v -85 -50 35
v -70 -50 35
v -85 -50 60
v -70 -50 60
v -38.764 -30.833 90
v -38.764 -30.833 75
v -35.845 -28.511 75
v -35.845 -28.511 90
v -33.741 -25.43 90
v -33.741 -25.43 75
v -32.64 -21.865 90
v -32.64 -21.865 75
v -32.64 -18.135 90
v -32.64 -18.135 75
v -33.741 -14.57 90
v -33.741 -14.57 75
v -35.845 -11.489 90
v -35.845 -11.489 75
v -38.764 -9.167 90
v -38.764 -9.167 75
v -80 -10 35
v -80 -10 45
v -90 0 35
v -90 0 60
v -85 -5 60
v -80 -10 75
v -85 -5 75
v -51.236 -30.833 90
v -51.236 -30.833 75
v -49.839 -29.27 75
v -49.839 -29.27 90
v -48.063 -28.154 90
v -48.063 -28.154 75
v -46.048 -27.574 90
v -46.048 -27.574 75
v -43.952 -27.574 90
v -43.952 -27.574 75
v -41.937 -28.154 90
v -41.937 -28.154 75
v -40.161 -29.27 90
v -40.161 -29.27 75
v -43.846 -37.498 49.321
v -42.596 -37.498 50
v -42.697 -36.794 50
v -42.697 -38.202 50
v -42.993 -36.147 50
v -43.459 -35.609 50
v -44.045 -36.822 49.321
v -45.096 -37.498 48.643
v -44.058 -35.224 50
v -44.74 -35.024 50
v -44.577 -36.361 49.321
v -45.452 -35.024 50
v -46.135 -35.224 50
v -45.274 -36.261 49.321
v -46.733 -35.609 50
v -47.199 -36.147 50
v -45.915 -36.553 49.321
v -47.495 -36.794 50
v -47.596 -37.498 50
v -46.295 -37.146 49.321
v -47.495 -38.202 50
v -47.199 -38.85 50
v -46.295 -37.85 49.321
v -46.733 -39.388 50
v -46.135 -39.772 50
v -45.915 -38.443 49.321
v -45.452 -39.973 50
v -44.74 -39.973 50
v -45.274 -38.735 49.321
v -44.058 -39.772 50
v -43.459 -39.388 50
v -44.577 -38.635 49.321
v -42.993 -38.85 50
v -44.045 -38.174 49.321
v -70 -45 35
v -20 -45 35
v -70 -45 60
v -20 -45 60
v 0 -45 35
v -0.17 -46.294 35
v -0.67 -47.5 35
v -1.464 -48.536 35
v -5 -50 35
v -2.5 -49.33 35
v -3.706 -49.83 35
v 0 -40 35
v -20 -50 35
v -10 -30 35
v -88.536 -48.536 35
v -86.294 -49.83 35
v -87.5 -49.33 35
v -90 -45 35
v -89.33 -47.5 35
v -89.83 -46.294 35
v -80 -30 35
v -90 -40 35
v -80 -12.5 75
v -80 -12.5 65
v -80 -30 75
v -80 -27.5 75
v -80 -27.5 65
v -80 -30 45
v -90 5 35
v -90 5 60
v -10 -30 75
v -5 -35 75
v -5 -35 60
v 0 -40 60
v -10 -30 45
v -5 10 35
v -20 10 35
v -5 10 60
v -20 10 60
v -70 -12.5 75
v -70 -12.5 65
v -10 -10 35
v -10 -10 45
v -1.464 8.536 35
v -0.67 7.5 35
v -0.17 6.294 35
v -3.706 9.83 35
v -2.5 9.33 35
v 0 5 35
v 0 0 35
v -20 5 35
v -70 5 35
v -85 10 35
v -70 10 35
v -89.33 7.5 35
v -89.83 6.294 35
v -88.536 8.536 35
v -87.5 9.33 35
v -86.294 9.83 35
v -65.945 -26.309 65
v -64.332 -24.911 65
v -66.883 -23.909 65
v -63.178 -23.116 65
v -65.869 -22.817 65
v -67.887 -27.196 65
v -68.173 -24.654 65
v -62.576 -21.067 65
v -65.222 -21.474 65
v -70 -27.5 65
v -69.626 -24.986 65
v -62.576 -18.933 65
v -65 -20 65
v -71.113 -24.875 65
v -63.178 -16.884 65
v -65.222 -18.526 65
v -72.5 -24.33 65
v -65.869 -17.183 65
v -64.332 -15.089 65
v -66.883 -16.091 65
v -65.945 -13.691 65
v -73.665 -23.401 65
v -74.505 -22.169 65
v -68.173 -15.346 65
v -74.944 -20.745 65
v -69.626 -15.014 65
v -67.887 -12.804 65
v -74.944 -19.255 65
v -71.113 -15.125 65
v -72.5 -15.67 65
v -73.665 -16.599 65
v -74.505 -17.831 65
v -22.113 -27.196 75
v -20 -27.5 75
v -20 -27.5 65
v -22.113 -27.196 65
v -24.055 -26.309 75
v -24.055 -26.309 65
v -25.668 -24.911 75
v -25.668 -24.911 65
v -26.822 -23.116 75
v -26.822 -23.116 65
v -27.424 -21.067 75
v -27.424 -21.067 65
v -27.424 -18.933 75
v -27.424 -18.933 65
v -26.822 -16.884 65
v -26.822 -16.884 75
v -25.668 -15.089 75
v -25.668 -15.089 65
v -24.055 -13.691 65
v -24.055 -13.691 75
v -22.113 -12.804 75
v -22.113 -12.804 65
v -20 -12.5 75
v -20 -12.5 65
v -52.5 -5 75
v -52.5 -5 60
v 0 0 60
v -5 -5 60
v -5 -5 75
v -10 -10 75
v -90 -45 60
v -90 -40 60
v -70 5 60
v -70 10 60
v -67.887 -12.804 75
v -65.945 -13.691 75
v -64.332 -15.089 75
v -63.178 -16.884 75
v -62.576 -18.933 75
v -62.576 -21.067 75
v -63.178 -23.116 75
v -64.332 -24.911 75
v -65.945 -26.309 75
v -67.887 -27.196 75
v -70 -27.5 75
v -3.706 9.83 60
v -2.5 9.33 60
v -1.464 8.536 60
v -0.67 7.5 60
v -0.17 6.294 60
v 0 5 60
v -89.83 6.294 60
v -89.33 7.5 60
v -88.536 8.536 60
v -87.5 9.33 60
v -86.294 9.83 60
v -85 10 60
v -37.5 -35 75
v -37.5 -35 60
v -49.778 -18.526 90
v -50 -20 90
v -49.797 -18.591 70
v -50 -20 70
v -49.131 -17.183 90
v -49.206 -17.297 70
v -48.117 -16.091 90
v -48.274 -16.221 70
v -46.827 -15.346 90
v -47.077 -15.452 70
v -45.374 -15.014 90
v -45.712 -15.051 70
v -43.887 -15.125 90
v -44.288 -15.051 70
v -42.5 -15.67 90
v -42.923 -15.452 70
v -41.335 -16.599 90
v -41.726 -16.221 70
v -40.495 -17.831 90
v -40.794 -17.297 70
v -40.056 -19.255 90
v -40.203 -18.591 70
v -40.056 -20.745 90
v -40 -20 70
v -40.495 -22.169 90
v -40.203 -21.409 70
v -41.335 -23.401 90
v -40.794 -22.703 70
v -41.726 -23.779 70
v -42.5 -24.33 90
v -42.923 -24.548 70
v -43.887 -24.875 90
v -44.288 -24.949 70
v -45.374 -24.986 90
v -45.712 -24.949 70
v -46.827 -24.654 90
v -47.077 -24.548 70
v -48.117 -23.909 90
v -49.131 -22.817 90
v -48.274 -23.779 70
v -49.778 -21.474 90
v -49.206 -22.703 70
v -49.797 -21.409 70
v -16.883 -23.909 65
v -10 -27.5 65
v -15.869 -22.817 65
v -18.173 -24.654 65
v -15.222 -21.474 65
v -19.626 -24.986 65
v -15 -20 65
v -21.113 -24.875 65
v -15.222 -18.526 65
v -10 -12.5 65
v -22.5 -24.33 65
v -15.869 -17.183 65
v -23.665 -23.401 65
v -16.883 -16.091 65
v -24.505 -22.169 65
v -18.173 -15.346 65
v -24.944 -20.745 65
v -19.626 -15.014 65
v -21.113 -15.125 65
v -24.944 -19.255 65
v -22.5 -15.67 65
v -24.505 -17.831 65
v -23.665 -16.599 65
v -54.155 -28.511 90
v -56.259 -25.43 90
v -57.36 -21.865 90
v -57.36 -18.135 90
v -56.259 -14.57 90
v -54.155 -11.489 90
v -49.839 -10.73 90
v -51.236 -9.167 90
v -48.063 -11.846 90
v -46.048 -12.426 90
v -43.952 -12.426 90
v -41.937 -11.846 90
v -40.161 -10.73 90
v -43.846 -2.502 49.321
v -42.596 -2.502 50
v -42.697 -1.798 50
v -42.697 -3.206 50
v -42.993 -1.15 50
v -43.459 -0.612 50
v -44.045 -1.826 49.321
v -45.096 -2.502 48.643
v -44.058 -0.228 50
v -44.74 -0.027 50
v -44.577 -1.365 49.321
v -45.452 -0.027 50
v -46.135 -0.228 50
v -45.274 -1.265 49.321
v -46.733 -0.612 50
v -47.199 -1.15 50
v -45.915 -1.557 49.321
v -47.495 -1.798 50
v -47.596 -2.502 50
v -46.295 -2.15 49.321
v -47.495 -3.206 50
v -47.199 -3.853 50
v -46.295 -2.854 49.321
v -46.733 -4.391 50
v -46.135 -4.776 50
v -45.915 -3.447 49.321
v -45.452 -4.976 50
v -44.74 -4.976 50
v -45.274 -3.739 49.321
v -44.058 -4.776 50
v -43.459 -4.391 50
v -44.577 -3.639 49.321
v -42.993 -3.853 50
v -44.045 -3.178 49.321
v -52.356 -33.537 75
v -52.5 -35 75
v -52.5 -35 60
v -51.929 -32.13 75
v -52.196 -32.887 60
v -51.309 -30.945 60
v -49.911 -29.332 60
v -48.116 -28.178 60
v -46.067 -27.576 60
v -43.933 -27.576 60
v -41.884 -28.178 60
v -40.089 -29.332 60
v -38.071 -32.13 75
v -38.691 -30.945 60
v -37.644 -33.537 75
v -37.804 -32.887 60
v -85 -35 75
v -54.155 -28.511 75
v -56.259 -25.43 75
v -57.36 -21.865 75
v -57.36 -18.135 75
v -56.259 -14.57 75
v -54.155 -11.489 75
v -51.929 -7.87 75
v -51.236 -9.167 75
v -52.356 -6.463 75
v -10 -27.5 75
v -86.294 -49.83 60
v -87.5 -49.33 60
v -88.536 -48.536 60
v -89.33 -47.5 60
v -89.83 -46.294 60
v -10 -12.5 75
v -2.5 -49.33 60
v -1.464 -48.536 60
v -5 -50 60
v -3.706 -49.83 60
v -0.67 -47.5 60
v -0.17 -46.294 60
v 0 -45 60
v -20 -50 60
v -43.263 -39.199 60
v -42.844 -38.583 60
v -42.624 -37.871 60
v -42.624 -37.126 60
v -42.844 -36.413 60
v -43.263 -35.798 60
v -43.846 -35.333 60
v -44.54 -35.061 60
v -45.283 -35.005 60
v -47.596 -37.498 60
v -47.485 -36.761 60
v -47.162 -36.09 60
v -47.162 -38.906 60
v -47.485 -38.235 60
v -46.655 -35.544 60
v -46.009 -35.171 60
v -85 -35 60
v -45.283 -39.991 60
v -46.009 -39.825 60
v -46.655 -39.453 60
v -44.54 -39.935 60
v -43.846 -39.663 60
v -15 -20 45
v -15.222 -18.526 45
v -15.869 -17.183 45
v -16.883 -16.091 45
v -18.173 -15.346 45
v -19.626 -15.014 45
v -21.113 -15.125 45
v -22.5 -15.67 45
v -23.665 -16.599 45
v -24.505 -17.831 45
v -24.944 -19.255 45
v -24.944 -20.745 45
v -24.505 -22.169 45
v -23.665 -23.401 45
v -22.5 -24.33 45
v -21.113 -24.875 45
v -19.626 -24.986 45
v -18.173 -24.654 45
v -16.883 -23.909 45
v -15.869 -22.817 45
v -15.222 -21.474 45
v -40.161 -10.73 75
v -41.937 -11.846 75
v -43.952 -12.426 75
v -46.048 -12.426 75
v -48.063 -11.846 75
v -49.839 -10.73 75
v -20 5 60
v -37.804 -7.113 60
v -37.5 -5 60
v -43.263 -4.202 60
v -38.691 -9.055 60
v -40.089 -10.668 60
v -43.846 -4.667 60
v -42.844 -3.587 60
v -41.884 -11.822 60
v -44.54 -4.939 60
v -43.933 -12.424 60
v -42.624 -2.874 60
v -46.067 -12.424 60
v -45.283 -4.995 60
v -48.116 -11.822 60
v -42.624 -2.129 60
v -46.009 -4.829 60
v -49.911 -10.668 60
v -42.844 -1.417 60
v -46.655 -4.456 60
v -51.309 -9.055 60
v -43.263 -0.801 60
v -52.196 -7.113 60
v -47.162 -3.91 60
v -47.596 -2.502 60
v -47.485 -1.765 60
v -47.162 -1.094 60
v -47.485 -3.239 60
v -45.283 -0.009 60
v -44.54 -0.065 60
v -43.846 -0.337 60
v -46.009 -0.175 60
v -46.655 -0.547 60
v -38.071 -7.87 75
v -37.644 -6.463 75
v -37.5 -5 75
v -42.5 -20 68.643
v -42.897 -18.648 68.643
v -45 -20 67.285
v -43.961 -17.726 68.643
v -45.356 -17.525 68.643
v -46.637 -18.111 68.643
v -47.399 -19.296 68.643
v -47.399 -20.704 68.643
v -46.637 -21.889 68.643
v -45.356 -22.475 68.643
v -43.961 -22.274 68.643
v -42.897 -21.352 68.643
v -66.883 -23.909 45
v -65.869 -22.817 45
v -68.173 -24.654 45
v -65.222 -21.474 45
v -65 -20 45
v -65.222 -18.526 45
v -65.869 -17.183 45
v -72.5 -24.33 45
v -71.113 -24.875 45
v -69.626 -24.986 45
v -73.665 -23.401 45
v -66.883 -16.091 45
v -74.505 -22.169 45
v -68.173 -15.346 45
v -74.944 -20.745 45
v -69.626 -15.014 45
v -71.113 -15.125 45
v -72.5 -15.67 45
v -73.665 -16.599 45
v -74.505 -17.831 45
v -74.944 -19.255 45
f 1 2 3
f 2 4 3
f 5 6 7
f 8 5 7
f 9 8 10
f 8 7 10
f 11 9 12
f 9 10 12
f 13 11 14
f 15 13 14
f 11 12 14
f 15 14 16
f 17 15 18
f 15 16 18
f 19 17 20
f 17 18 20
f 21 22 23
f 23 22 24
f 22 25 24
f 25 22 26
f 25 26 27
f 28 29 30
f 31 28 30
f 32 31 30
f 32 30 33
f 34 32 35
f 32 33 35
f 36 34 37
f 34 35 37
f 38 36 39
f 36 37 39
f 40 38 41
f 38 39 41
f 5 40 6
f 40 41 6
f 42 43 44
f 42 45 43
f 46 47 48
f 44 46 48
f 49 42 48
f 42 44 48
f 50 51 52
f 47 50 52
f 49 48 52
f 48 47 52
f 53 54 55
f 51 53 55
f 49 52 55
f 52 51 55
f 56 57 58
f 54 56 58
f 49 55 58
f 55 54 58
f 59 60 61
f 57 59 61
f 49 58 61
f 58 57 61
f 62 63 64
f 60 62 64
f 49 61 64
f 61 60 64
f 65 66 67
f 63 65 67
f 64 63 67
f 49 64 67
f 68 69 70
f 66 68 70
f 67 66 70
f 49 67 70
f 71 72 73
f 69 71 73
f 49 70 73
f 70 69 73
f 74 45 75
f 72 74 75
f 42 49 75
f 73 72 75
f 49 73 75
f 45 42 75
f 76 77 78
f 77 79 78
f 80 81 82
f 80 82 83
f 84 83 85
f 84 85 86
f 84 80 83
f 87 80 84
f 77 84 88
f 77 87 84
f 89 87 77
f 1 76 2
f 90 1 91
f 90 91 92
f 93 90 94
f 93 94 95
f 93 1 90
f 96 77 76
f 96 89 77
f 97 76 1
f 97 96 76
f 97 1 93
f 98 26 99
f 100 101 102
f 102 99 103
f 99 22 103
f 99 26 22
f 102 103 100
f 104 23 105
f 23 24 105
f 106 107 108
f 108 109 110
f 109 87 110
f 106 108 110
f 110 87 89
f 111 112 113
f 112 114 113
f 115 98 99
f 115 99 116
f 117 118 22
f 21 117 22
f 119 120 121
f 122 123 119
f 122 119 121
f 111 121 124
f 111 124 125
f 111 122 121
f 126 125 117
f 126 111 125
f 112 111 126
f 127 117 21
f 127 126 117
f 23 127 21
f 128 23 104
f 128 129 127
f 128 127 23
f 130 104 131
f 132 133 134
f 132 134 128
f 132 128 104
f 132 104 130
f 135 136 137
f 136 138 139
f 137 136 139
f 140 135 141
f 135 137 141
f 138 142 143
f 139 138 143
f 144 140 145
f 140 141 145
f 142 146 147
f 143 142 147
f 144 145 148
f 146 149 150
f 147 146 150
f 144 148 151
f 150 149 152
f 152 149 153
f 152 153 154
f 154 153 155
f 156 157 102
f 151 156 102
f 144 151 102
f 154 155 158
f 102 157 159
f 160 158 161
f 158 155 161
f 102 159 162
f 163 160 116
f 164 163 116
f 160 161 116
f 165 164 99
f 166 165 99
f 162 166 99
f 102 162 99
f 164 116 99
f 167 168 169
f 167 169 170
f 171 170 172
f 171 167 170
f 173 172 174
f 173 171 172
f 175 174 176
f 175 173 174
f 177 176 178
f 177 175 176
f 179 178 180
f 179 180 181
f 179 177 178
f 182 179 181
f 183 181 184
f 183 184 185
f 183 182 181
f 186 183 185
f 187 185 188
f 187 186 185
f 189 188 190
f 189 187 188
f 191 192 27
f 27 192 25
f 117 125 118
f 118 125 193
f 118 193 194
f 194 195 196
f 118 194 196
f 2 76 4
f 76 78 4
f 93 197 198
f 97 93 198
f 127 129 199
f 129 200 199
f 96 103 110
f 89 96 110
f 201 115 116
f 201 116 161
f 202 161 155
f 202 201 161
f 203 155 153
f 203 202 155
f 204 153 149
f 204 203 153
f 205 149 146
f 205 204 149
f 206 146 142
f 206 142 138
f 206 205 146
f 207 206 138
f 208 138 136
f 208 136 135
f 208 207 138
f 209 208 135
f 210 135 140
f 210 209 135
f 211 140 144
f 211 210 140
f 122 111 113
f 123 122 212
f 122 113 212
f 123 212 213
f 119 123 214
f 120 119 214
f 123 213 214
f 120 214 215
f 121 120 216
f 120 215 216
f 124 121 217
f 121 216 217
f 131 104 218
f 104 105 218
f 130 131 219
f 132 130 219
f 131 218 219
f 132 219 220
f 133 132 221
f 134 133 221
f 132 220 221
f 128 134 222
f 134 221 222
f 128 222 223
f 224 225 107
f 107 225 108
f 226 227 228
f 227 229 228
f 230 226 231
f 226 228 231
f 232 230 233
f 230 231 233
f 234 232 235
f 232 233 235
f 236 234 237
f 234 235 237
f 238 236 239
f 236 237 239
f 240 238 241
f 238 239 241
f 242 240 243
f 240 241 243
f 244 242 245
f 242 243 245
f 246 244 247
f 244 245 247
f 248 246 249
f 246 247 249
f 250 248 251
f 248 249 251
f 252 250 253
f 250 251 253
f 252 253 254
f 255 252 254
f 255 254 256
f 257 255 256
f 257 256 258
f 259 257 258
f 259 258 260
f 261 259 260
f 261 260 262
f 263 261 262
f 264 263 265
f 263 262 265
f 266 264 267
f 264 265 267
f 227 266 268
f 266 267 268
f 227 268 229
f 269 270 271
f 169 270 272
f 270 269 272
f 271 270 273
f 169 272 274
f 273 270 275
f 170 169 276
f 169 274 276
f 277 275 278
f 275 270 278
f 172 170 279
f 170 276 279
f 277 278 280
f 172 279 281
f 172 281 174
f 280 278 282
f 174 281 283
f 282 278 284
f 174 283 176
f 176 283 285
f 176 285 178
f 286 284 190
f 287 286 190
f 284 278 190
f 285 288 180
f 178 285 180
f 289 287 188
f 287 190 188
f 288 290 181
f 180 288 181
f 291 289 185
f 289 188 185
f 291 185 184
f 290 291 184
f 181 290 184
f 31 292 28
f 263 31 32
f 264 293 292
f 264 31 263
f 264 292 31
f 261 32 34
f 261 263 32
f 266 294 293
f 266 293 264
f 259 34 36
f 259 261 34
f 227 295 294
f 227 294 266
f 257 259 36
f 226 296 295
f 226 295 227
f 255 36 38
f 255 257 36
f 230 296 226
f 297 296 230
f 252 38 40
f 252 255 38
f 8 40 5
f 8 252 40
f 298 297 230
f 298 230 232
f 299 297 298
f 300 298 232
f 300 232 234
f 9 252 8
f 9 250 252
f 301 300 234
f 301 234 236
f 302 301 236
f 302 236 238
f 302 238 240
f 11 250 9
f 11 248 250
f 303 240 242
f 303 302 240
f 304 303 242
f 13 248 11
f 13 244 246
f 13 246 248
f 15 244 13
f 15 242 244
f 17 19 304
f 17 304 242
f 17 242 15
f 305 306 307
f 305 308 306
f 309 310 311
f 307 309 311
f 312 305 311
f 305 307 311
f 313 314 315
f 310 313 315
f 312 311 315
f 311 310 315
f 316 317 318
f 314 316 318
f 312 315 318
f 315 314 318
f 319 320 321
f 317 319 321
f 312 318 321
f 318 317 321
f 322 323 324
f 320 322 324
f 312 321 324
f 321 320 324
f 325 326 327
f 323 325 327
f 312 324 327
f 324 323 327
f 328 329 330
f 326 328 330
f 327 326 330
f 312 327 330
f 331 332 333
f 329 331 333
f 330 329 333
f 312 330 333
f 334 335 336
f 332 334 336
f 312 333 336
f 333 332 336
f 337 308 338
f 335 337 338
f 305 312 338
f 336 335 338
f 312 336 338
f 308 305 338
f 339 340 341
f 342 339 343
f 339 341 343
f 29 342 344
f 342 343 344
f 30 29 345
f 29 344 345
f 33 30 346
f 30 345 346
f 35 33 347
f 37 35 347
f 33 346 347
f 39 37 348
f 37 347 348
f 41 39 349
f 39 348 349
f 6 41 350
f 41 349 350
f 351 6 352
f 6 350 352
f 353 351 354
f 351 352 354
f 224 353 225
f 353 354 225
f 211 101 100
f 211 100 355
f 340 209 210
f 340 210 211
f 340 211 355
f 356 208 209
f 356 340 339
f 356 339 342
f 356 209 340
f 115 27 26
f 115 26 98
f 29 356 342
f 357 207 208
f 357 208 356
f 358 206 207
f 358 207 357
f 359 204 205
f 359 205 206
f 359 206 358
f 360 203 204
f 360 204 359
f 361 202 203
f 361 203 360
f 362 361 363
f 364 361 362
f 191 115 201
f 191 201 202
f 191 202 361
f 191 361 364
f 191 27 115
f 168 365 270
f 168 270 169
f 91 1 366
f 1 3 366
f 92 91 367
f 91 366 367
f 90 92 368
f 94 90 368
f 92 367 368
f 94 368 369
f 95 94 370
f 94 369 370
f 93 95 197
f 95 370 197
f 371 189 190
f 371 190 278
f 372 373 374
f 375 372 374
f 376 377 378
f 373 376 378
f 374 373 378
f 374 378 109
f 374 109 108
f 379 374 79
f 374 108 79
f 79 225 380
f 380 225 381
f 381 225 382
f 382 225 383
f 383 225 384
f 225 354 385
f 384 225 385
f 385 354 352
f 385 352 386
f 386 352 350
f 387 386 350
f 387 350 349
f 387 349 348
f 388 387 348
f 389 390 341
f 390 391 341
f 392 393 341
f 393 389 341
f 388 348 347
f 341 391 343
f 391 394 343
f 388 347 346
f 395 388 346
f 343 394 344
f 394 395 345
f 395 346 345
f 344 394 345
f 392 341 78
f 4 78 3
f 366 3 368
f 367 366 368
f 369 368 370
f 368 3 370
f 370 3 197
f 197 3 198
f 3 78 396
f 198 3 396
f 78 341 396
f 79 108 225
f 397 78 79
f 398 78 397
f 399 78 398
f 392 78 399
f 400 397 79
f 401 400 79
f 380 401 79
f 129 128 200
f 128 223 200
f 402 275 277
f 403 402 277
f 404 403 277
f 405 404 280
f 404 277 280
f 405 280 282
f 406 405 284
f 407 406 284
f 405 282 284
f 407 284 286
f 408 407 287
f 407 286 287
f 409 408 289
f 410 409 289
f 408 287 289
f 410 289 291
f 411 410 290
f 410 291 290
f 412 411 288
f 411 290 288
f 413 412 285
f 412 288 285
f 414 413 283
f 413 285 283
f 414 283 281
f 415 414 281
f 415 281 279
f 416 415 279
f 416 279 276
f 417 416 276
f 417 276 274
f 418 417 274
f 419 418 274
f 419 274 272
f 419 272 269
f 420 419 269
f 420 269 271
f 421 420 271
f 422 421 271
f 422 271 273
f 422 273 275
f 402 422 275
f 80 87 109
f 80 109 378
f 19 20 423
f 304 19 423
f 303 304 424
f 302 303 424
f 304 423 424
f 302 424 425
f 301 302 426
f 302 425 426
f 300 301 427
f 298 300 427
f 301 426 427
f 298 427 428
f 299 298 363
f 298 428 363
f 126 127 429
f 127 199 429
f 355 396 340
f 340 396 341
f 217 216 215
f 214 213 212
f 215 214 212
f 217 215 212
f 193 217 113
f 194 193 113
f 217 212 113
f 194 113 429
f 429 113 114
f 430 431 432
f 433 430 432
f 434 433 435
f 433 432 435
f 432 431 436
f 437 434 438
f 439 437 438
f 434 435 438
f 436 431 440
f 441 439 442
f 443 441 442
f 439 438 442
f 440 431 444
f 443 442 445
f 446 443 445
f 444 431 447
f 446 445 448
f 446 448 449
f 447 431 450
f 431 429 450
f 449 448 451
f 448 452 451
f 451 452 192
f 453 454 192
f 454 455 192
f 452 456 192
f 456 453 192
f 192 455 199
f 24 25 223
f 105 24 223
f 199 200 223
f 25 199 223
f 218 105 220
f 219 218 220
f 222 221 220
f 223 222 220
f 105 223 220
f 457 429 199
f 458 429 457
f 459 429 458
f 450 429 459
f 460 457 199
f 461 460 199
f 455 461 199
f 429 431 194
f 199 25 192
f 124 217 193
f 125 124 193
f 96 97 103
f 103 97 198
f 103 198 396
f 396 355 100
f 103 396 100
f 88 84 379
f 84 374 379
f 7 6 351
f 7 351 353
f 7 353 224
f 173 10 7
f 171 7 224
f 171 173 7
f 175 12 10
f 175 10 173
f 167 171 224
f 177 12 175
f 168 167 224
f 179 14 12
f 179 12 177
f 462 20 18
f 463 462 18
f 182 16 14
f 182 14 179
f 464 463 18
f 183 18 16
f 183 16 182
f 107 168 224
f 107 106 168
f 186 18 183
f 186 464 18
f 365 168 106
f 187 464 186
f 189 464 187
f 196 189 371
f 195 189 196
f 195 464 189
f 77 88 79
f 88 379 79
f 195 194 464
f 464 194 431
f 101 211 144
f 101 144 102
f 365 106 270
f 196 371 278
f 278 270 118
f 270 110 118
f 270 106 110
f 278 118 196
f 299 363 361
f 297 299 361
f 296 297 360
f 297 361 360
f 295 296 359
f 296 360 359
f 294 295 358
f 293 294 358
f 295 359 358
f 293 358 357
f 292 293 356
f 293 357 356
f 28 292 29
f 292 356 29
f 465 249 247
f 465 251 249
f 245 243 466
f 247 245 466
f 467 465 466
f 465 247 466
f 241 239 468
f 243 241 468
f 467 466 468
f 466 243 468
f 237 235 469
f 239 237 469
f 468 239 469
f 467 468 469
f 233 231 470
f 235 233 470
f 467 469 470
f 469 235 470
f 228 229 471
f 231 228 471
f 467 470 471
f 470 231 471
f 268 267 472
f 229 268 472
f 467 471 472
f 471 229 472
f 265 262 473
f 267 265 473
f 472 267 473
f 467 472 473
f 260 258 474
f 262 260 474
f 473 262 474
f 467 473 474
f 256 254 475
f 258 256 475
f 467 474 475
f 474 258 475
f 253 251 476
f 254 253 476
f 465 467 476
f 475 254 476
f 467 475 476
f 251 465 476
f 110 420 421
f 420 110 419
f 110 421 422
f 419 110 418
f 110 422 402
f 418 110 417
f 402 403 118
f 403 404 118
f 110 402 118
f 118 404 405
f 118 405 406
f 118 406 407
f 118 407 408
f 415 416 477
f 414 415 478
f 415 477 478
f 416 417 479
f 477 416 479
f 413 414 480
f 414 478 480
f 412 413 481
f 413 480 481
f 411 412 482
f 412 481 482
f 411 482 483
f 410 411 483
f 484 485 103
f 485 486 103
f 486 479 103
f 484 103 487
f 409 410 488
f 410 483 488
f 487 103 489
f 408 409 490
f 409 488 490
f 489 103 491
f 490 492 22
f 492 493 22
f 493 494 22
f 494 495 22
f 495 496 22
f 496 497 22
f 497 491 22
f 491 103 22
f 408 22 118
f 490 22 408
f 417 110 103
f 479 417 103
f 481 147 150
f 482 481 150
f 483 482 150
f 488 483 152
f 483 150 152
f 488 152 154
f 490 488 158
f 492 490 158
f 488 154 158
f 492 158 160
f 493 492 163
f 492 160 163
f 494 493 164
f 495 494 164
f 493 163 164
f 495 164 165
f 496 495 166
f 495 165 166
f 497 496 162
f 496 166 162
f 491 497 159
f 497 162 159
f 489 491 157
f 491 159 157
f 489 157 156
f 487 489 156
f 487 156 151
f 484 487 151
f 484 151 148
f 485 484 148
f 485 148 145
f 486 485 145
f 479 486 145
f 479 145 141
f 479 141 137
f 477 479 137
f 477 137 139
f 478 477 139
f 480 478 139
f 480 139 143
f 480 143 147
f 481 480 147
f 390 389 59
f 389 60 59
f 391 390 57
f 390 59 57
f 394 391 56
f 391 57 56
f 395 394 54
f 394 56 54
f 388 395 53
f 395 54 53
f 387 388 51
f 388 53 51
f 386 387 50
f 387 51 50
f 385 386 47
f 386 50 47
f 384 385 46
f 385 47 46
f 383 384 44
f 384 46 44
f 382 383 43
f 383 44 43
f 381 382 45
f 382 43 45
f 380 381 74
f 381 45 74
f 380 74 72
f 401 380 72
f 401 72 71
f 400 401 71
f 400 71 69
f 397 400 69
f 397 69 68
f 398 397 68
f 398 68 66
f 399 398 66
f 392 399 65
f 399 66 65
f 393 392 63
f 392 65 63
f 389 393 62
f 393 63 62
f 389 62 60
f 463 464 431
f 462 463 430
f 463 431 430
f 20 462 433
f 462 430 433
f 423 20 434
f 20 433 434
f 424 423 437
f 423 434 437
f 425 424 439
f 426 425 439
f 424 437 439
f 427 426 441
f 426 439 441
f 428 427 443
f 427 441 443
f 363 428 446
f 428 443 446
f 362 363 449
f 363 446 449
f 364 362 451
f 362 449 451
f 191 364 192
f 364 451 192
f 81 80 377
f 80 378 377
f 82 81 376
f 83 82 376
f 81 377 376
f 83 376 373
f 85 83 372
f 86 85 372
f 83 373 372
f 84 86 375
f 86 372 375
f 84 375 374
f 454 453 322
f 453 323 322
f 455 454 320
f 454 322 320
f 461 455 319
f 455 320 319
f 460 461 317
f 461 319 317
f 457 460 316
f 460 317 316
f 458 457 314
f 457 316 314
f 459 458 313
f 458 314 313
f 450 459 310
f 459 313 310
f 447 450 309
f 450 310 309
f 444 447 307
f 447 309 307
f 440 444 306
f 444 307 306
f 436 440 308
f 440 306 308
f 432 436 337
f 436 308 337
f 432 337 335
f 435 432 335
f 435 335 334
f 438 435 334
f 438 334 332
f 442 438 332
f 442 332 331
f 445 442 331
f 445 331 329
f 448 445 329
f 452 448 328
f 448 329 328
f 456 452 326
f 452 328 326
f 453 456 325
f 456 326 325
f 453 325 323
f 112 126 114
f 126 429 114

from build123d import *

# Parameters (mm, degrees)
BOSS_EXTRUDE1_DEPTH            = 60
SKETCH2_W                      = 30
SKETCH2_H                      = 10
CUT_EXTRUDE1_DEPTH             = 253
BOSS_EXTRUDE2_DEPTH            = 15
CUT_EXTRUDE5_DEPTH             = 10
SKETCH8_R                      = 5
CUT_EXTRUDE6_DEPTH             = 124
BOSS_EXTRUDE3_DEPTH            = 15
SKETCH15_W                     = 45
SKETCH15_H                     = 60
CUT_EXTRUDE8_DEPTH             = 90
BOSS_EXTRUDE4_DEPTH            = 10
F_1_2_1_2_DIAMETER_HOLE7_D     = 5
F_1_2_1_2_DIAMETER_HOLE7_DEPTH = 10
F_1_2_1_2_DIAMETER_HOLE7_TIP   = 1.357389249
F_10_0_10_DIAMETER_HOLE4_D     = 10
F_10_0_10_DIAMETER_HOLE4_DEPTH = 20
F_10_0_10_DIAMETER_HOLE4_TIP   = 2.714778498


with BuildPart() as part:
    # Sketch1 → Boss-Extrude1 (new body)
    with BuildSketch(Plane.XY):
        with BuildLine():
            Line((-90, 0), (-90, 5))
            ThreePointArc((-90, 5), (-88.535533906, 8.535533906), (-85, 10))
            Line((-85, 10), (-70, 10))
            Line((-70, 10), (-70, 5))
            Line((-70, 5), (-20, 5))
            Line((-20, 5), (-20, 10))
            Line((-20, 10), (-5, 10))
            ThreePointArc((-5, 10), (-1.464466094, 8.535533906), (0, 5))
            Line((0, 5), (0, 0))
            Line((0, 0), (-10, -10))
            Line((-10, -10), (-10, -30))
            Line((-10, -30), (0, -40))
            Line((0, -40), (0, -45))
            ThreePointArc((0, -45), (-1.464466094, -48.535533906), (-5, -50))
            Line((-5, -50), (-20, -50))
            Line((-20, -50), (-20, -45))
            Line((-20, -45), (-70, -45))
            Line((-70, -45), (-70, -50))
            Line((-70, -50), (-85, -50))
            ThreePointArc((-85, -50), (-88.535533906, -48.535533906), (-90, -45))
            Line((-90, -45), (-90, -40))
            Line((-90, -40), (-80, -30))
            Line((-80, -30), (-80, -10))
            Line((-80, -10), (-90, 0))
        make_face()
    extrude(amount=BOSS_EXTRUDE1_DEPTH)

    # Sketch2 → Cut-Extrude1 (cut)
    with BuildSketch(Plane(origin=(0, 0, 0), x_dir=(0, 0, -1), z_dir=(1, 0, 0))):
        with Locations((-30, -45)):
            Rectangle(SKETCH2_W, SKETCH2_H)
    extrude(amount=-CUT_EXTRUDE1_DEPTH, mode=Mode.SUBTRACT)

    # Sketch3 → Boss-Extrude2 (add)
    with BuildSketch(Plane.XY.offset(60)):
        with BuildLine():
            Line((-85, -5), (-80, -10))
            Line((-80, -10), (-80, -30))
            Line((-80, -30), (-85, -35))
            Line((-85, -35), (-52.5, -35))
            ThreePointArc((-52.5, -35), (-45, -27.5), (-37.5, -35))
            Line((-37.5, -35), (-5, -35))
            Line((-5, -35), (-10, -30))
            Line((-10, -30), (-10, -10))
            Line((-10, -10), (-5, -5))
            Line((-5, -5), (-37.5, -5))
            ThreePointArc((-37.5, -5), (-45, -12.5), (-52.5, -5))
            Line((-52.5, -5), (-85, -5))
        make_face()
    extrude(amount=BOSS_EXTRUDE2_DEPTH)

    # Sketch4 → Cut-Extrude5 (cut)
    with BuildSketch(Plane.XY.offset(75)):
        with BuildLine():
            Line((-80, -12.5), (-70, -12.5))
            ThreePointArc((-70, -12.5), (-62.5, -20), (-70, -27.5))
            Line((-70, -27.5), (-80, -27.5))
            Line((-80, -27.5), (-80, -12.5))
        make_face()
        with BuildLine():
            Line((-10, -12.5), (-10, -27.5))
            Line((-10, -27.5), (-20, -27.5))
            ThreePointArc((-20, -27.5), (-27.5, -20), (-20, -12.5))
            Line((-20, -12.5), (-10, -12.5))
        make_face()
    extrude(amount=-CUT_EXTRUDE5_DEPTH, mode=Mode.SUBTRACT)

    # Sketch8 → Cut-Extrude6 (cut)
    with BuildSketch(Plane.XY.offset(65)):
        with Locations((-20, -20)):
            Circle(SKETCH8_R)
        with Locations((-70, -20)):
            Circle(SKETCH8_R)
    extrude(amount=-CUT_EXTRUDE6_DEPTH, mode=Mode.SUBTRACT)

    # Sketch11 → Boss-Extrude3 (add)
    with BuildSketch(Plane.XY.offset(75)):
        with BuildLine():
            ThreePointArc((-51.236095645, -9.166666667), (-57.5, -20), (-51.236095645, -30.833333333))
            ThreePointArc((-51.236095645, -30.833333333), (-45, -27.5), (-38.763904355, -30.833333333))
            ThreePointArc((-38.763904355, -30.833333333), (-32.5, -20), (-38.763904355, -9.166666667))
            ThreePointArc((-38.763904355, -9.166666667), (-45, -12.5), (-51.236095645, -9.166666667))
        make_face()
    extrude(amount=BOSS_EXTRUDE3_DEPTH)

    # Sketch15 → Cut-Extrude8 (cut, symmetric)
    with BuildSketch(Plane.ZY.offset(80)):
        with Locations((22.5, -20)):
            Rectangle(SKETCH15_W, SKETCH15_H)
    extrude(amount=CUT_EXTRUDE8_DEPTH, both=True, mode=Mode.SUBTRACT)

    # Sketch16 → Boss-Extrude4 (add)
    with BuildSketch(Plane(origin=(0, 0, 45), x_dir=(-1, 0, 0), z_dir=(0, 0, -1))):
        with BuildLine():
            Line((10, -10), (80, -10))
            Line((80, -10), (90, 0))
            Line((90, 0), (90, 5))
            ThreePointArc((90, 5), (88.535533906, 8.535533906), (85, 10))
            Line((85, 10), (70, 10))
            Line((70, 10), (70, 5))
            Line((70, 5), (20, 5))
            Line((20, 5), (20, 10))
            Line((20, 10), (5, 10))
            ThreePointArc((5, 10), (1.464466094, 8.535533906), (0, 5))
            Line((0, 5), (0, 0))
            Line((0, 0), (10, -10))
        make_face()
        with BuildLine():
            Line((80, -30), (10, -30))
            Line((10, -30), (0, -40))
            Line((0, -40), (0, -45))
            ThreePointArc((0, -45), (1.464466094, -48.535533906), (5, -50))
            Line((5, -50), (20, -50))
            Line((20, -50), (20, -45))
            Line((20, -45), (70, -45))
            Line((70, -45), (70, -50))
            Line((70, -50), (85, -50))
            ThreePointArc((85, -50), (88.535533906, -48.535533906), (90, -45))
            Line((90, -45), (90, -40))
            Line((90, -40), (80, -30))
        make_face()
    extrude(amount=BOSS_EXTRUDE4_DEPTH)

    # Ø1.2 (1.2) Diameter Hole7
    with Locations(Plane(origin=(-45.096109005, -2.501848071, 60), x_dir=(1, 0, 0), z_dir=(0, 0, 1))):
        with Locations((0, 0), (0, -34.996303858)):
            Hole(F_1_2_1_2_DIAMETER_HOLE7_D / 2, depth=F_1_2_1_2_DIAMETER_HOLE7_DEPTH)
            with Locations((0, 0, -(F_1_2_1_2_DIAMETER_HOLE7_DEPTH + F_1_2_1_2_DIAMETER_HOLE7_TIP / 2))):  # 123° drill point
                Cone(0, F_1_2_1_2_DIAMETER_HOLE7_D / 2, F_1_2_1_2_DIAMETER_HOLE7_TIP, mode=Mode.SUBTRACT)

    # Ø10.0 (10) Diameter Hole4
    with Locations(Plane(origin=(-45, -20, 90), x_dir=(1, 0, 0), z_dir=(0, 0, 1))):
        with Locations((0, 0)):
            Hole(F_10_0_10_DIAMETER_HOLE4_D / 2, depth=F_10_0_10_DIAMETER_HOLE4_DEPTH)
            with Locations((0, 0, -(F_10_0_10_DIAMETER_HOLE4_DEPTH + F_10_0_10_DIAMETER_HOLE4_TIP / 2))):  # 123° drill point
                Cone(0, F_10_0_10_DIAMETER_HOLE4_D / 2, F_10_0_10_DIAMETER_HOLE4_TIP, mode=Mode.SUBTRACT)


solid = part.part
